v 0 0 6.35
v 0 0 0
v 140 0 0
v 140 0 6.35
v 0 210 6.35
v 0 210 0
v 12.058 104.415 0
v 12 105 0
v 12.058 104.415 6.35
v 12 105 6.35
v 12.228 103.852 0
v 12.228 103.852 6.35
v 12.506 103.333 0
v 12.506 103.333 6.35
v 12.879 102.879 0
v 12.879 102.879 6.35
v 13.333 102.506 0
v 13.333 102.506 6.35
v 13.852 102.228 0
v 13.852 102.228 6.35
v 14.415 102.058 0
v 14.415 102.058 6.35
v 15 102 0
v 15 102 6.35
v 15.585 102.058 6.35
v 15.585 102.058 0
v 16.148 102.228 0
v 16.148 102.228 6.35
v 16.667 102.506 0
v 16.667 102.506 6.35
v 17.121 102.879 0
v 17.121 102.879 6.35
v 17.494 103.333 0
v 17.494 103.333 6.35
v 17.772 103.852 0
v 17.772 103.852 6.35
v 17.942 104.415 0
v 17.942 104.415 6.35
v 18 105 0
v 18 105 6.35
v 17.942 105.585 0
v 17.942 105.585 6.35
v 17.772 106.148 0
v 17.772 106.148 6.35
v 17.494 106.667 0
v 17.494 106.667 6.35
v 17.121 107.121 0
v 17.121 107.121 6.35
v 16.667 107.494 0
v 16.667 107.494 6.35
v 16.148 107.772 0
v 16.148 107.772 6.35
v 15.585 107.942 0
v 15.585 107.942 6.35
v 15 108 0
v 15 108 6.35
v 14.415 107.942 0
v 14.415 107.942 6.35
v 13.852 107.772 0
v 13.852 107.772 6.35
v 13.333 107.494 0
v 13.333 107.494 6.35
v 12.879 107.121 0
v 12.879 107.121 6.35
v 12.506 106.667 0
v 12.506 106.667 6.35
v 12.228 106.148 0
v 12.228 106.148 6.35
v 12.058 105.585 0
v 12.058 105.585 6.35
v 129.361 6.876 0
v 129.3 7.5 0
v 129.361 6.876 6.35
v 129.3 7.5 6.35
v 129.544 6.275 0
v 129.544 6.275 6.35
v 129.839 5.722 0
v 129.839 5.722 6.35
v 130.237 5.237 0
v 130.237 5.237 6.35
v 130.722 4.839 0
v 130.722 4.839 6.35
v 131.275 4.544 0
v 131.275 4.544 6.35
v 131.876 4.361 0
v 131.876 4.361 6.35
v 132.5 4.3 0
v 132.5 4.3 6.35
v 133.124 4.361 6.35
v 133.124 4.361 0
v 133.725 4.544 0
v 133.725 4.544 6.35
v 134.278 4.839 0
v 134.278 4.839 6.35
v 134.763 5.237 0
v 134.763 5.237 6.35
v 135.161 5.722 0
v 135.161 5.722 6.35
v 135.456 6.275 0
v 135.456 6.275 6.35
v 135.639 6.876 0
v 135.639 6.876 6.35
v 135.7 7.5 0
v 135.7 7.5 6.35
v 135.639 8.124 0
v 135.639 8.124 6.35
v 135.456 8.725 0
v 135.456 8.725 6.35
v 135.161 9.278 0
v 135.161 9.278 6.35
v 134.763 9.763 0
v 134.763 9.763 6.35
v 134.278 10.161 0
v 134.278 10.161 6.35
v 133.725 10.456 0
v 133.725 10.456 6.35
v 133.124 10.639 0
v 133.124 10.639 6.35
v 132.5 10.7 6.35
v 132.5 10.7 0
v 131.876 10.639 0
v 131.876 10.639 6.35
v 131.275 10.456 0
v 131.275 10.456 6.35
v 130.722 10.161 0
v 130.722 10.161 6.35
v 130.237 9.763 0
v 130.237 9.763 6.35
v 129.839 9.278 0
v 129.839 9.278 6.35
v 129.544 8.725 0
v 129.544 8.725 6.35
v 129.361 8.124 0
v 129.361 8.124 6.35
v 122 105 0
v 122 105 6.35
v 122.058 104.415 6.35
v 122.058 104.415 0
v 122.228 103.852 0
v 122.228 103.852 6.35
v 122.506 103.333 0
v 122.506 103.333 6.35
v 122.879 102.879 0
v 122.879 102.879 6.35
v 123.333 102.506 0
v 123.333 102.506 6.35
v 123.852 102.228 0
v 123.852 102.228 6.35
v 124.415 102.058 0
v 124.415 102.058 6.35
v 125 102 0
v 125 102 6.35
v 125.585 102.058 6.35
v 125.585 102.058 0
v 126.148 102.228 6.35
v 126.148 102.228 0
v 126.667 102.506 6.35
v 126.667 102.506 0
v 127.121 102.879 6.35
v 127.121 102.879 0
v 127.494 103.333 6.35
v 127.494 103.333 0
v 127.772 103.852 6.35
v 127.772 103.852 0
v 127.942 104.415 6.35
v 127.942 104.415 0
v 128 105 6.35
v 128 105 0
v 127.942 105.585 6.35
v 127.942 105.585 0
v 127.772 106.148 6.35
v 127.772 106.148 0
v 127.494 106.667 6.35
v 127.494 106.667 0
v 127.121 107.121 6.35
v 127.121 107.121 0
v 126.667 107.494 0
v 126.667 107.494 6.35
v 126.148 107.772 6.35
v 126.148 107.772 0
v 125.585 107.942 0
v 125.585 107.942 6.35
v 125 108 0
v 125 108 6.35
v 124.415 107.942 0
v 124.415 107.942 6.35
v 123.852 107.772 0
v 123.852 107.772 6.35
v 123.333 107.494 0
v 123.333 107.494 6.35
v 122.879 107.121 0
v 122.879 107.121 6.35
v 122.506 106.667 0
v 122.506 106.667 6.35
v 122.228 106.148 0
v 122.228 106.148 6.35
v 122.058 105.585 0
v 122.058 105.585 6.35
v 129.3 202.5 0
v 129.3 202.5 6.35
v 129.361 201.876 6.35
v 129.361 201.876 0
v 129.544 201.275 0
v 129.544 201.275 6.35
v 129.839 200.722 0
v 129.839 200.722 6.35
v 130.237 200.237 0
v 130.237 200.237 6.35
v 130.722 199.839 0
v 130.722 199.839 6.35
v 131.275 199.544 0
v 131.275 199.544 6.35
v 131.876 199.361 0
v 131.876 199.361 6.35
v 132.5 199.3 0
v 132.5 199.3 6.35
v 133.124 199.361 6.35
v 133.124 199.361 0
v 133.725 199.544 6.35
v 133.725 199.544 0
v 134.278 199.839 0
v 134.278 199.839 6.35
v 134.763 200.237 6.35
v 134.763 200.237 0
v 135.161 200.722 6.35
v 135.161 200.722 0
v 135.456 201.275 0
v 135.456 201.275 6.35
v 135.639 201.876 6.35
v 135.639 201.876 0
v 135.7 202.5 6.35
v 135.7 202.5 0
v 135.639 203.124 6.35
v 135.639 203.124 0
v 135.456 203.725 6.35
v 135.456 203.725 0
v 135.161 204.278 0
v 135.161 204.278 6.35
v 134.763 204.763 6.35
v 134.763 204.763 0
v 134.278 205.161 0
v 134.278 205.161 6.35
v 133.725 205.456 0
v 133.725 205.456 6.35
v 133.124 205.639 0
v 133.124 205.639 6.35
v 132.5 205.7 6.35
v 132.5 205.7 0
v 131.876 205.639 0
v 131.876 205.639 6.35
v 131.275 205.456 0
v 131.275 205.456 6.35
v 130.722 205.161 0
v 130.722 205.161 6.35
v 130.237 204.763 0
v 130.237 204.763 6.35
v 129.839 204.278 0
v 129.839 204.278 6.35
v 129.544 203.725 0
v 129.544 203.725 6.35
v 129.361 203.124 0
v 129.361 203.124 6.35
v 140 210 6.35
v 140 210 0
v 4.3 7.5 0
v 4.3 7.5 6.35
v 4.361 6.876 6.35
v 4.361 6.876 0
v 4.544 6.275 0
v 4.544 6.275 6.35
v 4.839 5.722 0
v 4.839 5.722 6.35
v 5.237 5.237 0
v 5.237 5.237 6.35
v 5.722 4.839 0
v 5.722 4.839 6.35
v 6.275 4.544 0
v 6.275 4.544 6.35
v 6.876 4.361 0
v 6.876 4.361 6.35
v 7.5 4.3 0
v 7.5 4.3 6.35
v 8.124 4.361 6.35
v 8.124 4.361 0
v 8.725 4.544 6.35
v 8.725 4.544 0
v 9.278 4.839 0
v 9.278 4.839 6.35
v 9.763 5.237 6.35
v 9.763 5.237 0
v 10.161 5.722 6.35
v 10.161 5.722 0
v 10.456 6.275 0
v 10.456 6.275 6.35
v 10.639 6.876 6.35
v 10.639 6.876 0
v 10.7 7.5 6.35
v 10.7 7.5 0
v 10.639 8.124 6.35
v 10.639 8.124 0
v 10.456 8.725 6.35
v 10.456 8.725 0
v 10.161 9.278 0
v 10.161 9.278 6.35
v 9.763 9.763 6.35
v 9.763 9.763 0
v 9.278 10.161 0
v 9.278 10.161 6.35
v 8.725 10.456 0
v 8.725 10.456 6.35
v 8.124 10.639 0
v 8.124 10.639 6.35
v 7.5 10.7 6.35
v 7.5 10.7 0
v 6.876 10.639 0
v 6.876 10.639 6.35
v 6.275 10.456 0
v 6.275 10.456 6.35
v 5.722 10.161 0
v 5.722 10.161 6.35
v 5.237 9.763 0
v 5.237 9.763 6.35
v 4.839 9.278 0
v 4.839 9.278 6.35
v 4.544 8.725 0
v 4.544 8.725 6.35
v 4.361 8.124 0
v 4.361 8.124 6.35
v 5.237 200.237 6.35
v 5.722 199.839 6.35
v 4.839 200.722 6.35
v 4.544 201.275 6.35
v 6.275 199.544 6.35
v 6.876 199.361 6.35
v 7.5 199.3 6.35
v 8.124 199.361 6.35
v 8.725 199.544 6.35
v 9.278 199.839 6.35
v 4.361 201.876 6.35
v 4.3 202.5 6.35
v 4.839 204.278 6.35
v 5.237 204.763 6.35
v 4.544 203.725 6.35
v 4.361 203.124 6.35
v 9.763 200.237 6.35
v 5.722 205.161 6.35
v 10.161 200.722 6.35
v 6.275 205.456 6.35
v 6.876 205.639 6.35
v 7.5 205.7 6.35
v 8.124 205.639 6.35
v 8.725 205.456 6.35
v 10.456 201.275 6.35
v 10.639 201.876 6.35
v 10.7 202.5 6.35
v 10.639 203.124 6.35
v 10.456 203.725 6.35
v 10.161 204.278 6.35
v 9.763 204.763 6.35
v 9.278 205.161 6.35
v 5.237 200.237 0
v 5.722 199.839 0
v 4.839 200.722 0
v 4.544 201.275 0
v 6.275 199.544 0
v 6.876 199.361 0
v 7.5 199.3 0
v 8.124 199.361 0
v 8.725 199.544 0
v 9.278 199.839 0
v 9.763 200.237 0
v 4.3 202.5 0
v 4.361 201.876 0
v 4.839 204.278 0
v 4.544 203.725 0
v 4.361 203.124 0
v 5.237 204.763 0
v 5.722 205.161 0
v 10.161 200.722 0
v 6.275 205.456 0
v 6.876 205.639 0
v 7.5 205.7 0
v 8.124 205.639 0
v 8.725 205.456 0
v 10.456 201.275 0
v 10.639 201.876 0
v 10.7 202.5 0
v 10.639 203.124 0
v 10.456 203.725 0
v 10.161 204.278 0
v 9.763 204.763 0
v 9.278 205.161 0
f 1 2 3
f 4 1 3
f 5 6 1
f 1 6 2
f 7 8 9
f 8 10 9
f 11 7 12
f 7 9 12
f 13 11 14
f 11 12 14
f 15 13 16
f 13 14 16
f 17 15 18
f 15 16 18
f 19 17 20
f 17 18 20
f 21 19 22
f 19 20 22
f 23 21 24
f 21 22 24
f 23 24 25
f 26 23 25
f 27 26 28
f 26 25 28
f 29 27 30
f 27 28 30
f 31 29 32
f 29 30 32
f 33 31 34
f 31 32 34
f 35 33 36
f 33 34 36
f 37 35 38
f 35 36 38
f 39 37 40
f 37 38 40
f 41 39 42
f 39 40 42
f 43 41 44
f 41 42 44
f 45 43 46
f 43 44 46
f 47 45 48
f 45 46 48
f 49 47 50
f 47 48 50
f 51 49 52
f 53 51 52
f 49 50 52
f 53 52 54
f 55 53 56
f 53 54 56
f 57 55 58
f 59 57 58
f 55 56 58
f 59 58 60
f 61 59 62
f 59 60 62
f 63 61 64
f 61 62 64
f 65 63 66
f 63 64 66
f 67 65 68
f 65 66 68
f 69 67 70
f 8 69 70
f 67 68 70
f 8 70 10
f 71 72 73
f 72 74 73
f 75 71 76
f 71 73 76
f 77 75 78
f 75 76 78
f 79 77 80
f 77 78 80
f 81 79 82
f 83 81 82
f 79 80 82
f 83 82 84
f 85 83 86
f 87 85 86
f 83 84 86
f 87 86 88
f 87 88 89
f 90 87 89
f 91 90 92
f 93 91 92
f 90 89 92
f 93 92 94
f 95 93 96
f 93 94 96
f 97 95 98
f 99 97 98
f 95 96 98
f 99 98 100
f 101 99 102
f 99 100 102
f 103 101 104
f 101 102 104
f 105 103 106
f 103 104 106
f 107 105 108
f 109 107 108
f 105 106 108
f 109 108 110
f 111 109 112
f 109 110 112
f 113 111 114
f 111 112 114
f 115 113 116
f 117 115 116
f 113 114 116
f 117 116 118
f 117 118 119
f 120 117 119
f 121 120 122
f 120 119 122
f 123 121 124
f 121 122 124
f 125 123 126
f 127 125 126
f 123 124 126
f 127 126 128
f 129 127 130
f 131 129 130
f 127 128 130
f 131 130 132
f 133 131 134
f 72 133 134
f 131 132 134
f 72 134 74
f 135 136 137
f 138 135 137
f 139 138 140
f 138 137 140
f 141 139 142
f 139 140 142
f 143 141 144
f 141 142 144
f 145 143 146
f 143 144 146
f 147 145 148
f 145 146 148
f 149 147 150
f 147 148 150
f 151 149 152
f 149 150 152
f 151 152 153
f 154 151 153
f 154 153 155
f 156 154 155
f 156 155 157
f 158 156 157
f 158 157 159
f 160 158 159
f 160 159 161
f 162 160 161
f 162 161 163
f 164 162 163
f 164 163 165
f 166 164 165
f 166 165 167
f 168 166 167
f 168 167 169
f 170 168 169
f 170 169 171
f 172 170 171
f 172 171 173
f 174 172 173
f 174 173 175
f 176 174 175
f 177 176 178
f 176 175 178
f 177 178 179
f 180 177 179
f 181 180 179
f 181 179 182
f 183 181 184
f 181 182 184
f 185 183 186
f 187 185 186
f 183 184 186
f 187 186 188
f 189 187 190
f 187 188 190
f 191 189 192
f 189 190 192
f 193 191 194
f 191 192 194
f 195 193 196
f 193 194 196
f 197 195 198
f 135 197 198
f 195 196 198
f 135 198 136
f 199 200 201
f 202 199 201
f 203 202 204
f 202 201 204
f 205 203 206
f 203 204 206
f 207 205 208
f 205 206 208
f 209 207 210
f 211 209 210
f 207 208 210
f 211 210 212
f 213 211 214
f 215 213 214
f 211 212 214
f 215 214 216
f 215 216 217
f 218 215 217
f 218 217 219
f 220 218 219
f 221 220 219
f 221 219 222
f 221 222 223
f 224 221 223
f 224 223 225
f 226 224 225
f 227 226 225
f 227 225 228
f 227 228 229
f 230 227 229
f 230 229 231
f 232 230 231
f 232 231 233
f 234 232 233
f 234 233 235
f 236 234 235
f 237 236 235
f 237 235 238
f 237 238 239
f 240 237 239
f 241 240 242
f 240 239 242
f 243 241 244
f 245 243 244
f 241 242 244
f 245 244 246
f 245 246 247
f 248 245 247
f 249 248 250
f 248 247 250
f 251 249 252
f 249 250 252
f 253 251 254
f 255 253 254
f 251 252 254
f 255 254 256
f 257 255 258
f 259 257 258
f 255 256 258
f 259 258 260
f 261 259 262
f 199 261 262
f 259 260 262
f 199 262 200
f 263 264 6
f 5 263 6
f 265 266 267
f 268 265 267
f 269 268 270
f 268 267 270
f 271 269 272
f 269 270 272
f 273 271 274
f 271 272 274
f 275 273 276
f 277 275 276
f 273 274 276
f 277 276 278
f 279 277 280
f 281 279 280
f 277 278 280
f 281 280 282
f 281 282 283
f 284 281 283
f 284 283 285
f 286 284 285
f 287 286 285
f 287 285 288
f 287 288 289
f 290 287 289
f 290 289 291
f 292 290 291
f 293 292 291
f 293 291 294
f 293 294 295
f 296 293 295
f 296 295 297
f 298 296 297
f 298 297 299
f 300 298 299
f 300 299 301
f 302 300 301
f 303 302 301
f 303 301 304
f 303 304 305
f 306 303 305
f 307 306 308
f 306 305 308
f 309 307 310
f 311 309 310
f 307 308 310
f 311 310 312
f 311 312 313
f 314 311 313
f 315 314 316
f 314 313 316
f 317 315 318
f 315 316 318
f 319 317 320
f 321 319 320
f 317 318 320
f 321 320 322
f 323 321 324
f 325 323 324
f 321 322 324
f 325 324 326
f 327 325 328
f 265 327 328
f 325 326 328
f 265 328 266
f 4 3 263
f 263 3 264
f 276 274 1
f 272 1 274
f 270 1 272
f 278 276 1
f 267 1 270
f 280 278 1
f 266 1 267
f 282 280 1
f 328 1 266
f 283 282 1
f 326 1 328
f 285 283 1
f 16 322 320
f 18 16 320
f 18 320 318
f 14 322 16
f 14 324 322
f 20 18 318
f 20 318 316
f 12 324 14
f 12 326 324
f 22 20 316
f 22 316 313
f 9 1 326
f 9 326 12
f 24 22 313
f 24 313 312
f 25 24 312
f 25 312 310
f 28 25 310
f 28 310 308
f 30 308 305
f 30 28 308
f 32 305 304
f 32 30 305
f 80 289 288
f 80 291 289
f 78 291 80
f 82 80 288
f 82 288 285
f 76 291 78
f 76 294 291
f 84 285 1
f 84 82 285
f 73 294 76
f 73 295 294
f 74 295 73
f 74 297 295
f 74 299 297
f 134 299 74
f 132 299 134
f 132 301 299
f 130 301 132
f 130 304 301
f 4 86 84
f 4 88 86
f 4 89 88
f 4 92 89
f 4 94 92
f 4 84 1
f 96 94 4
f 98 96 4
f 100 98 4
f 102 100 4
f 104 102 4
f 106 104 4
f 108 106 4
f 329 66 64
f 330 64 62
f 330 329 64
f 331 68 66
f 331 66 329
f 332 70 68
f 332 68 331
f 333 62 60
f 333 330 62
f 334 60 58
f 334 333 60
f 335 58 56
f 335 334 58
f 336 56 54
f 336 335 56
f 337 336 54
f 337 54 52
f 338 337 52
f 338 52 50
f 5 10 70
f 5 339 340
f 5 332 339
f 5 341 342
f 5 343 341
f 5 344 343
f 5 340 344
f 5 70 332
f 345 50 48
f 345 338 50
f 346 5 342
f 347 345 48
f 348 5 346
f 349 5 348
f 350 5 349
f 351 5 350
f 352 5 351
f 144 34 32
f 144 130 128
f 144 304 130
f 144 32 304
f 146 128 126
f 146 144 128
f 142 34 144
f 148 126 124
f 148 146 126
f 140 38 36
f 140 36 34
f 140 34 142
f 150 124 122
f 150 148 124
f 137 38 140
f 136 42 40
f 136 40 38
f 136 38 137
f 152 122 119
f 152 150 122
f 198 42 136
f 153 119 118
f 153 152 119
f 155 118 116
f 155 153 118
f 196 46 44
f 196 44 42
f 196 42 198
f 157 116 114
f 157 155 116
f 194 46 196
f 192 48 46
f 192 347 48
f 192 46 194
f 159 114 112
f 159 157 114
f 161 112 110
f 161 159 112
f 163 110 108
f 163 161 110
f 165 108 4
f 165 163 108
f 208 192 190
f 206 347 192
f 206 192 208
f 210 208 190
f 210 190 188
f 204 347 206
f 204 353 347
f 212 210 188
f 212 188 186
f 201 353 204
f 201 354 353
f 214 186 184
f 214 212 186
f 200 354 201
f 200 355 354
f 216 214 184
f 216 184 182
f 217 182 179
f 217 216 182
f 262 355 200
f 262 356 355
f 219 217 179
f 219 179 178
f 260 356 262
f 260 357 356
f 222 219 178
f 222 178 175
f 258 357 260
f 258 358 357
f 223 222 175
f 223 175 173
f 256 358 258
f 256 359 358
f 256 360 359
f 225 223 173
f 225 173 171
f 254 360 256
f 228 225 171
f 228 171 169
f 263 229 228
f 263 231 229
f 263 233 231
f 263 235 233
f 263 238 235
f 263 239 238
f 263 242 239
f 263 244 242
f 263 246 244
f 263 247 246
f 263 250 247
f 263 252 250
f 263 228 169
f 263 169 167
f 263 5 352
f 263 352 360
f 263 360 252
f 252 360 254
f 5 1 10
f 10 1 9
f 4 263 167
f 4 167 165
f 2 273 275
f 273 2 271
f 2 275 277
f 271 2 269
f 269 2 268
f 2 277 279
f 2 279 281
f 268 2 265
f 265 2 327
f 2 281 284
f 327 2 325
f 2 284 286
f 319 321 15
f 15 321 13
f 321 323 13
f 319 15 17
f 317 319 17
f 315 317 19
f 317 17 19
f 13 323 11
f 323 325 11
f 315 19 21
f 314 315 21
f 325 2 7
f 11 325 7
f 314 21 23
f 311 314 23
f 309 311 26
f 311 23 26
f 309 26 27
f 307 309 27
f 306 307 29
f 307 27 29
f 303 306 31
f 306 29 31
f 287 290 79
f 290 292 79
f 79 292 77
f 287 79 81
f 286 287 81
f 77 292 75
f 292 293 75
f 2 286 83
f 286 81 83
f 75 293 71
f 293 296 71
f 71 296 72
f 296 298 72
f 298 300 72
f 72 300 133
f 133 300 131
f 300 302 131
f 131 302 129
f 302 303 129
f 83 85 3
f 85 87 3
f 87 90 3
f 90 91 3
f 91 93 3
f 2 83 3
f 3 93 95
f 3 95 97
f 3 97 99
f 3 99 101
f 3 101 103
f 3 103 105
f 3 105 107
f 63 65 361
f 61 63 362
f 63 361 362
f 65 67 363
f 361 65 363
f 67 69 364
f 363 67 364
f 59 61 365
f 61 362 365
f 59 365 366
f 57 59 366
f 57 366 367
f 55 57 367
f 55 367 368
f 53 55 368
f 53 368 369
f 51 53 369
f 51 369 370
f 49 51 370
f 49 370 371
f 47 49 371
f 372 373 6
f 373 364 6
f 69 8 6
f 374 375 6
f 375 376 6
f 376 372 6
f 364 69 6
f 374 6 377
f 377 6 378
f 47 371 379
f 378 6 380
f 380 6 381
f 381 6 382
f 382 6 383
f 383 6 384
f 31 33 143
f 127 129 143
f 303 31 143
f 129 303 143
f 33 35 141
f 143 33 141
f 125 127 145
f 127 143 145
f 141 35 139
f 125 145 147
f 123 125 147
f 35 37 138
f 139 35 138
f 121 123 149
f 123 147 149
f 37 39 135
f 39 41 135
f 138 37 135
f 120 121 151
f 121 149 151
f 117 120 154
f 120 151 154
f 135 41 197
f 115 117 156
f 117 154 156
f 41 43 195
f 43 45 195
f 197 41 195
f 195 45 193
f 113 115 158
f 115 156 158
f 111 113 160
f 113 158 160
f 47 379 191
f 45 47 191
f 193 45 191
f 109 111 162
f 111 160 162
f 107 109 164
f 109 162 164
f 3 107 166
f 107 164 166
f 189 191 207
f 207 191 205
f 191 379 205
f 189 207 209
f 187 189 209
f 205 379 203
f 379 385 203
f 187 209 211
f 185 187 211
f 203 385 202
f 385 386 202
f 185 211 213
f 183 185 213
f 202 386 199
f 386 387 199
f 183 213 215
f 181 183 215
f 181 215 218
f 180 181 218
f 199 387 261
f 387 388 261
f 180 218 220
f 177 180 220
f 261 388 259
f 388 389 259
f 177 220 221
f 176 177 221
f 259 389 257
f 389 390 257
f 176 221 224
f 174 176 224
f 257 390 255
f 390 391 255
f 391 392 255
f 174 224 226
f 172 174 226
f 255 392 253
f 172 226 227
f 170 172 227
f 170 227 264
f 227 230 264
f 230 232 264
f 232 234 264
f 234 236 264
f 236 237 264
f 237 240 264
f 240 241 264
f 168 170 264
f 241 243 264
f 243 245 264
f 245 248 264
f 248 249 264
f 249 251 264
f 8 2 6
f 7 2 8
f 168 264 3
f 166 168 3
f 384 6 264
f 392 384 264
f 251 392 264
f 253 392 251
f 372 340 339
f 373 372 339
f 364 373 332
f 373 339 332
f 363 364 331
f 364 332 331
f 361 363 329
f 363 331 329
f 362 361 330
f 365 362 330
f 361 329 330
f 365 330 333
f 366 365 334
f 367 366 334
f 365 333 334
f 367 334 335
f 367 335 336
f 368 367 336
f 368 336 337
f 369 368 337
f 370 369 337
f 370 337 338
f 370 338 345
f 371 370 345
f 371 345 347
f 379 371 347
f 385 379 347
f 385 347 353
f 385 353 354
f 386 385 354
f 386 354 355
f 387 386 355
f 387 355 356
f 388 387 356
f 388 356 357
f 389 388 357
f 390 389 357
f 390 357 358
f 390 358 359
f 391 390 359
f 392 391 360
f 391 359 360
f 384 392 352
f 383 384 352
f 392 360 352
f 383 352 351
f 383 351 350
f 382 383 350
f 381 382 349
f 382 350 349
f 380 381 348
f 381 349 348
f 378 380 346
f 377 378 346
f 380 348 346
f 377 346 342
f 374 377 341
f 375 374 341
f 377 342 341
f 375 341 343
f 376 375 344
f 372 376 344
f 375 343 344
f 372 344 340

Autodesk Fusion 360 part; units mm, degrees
sketch "Sketch1" plane through (0, 0, 0) normal (0, 0, 1) x (1, 0, 0)
  line L0 (0, 0) -> (140, 0)
  line L1 (140, 0) -> (140, 210)
  line L2 (140, 210) -> (0, 210)
  line L3 (0, 210) -> (0, 0)
  dimension "d1" = 140
  dimension "d2" = 210
extrude "Extrude1" add sketch "Sketch1" along normal blind 6.35
sketch "Sketch2" plane through (0, 0, 6.35) normal (0, 0, 1) x (-1, 0, 0)
  line L0 (0, -210) -> (0, 0)
  line L1 (0, 0) -> (-140, 0)
  line L2 (-140, 0) -> (-140, -210)
  line L3 (-140, -210) -> (0, -210)
  circle A0 centre (-132.5, -7.5) radius 3.2
  line L4 (-140, -105) -> (0, -105)
  line L5 (-70, 0) -> (-70, -210)
  circle A1 centre (-7.5, -7.5) radius 3.2
  circle A2 centre (-132.5, -202.5) radius 3.2
  circle A3 centre (-7.5, -202.5) radius 3.2
  dimension "d5" = 6.4
  dimension "d6" = 7.5
  dimension "d7" = 7.5
extrude "Extrude2" cut sketch "Sketch2" against normal blind 10 contours A0 | A1 | A2 | A3
sketch "Sketch3" plane through (0, 0, 6.35) normal (0, 0, 1) x (-1, 0, 0)
  circle A0 centre (-7.5, -7.5) radius 3.2
  circle A1 centre (-7.5, -202.5) radius 3.2
  circle A2 centre (-132.5, -7.5) radius 3.2
  circle A3 centre (-132.5, -202.5) radius 3.2
  line L0 (0, -210) -> (0, 0)
  line L1 (0, 0) -> (-140, 0)
  line L2 (-140, 0) -> (-140, -210)
  line L3 (-140, -210) -> (0, -210)
  line L4 (0, -105) -> (-140, -105)
  circle A4 centre (-15, -105) radius 3
  circle A5 centre (-125, -105) radius 3
  dimension "d10" = 6
  dimension "d11" = 6
  dimension "d12" = 110
  dimension "d13" = 15
extrude "Extrude3" cut sketch "Sketch3" against normal blind 10 contours L4 A4 | L4 A4 | L4 A5 | L4 A5
